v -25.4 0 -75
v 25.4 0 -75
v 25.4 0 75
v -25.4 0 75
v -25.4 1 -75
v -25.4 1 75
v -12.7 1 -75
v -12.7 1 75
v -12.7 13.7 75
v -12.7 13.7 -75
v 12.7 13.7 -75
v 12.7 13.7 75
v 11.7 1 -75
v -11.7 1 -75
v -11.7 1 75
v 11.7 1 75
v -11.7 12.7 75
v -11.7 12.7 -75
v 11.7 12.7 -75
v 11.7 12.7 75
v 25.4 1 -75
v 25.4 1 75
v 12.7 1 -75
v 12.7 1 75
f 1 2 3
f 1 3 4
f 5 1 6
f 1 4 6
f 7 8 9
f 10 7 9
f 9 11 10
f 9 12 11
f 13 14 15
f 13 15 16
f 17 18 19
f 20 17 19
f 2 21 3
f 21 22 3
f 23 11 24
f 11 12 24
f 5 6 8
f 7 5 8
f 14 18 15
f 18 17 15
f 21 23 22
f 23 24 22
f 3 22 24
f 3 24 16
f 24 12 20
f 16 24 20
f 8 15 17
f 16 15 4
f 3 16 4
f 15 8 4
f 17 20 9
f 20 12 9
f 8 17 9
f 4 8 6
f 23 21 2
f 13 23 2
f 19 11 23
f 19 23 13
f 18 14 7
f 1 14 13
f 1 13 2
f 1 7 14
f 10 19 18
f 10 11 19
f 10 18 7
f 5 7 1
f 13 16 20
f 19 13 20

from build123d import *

# Parameters (mm, degrees)
SALIENTE_EXTRUIR1_DEPTH = 75


with BuildPart() as part:
    # Croquis1 → Saliente-Extruir1 (new body, symmetric)
    with BuildSketch(Plane.XY):
        Polygon((0, 13.7), (12.7, 13.7), (12.7, 1), (25.4, 1), (25.4, 0), (-25.4, 0), (-25.4, 1), (-12.7, 1), (-12.7, 13.7), align=None)
        Polygon((0, 12.7), (-11.7, 12.7), (-11.7, 1), (11.7, 1), (11.7, 12.7), align=None, mode=Mode.SUBTRACT)
    extrude(amount=SALIENTE_EXTRUIR1_DEPTH, both=True)


solid = part.part
